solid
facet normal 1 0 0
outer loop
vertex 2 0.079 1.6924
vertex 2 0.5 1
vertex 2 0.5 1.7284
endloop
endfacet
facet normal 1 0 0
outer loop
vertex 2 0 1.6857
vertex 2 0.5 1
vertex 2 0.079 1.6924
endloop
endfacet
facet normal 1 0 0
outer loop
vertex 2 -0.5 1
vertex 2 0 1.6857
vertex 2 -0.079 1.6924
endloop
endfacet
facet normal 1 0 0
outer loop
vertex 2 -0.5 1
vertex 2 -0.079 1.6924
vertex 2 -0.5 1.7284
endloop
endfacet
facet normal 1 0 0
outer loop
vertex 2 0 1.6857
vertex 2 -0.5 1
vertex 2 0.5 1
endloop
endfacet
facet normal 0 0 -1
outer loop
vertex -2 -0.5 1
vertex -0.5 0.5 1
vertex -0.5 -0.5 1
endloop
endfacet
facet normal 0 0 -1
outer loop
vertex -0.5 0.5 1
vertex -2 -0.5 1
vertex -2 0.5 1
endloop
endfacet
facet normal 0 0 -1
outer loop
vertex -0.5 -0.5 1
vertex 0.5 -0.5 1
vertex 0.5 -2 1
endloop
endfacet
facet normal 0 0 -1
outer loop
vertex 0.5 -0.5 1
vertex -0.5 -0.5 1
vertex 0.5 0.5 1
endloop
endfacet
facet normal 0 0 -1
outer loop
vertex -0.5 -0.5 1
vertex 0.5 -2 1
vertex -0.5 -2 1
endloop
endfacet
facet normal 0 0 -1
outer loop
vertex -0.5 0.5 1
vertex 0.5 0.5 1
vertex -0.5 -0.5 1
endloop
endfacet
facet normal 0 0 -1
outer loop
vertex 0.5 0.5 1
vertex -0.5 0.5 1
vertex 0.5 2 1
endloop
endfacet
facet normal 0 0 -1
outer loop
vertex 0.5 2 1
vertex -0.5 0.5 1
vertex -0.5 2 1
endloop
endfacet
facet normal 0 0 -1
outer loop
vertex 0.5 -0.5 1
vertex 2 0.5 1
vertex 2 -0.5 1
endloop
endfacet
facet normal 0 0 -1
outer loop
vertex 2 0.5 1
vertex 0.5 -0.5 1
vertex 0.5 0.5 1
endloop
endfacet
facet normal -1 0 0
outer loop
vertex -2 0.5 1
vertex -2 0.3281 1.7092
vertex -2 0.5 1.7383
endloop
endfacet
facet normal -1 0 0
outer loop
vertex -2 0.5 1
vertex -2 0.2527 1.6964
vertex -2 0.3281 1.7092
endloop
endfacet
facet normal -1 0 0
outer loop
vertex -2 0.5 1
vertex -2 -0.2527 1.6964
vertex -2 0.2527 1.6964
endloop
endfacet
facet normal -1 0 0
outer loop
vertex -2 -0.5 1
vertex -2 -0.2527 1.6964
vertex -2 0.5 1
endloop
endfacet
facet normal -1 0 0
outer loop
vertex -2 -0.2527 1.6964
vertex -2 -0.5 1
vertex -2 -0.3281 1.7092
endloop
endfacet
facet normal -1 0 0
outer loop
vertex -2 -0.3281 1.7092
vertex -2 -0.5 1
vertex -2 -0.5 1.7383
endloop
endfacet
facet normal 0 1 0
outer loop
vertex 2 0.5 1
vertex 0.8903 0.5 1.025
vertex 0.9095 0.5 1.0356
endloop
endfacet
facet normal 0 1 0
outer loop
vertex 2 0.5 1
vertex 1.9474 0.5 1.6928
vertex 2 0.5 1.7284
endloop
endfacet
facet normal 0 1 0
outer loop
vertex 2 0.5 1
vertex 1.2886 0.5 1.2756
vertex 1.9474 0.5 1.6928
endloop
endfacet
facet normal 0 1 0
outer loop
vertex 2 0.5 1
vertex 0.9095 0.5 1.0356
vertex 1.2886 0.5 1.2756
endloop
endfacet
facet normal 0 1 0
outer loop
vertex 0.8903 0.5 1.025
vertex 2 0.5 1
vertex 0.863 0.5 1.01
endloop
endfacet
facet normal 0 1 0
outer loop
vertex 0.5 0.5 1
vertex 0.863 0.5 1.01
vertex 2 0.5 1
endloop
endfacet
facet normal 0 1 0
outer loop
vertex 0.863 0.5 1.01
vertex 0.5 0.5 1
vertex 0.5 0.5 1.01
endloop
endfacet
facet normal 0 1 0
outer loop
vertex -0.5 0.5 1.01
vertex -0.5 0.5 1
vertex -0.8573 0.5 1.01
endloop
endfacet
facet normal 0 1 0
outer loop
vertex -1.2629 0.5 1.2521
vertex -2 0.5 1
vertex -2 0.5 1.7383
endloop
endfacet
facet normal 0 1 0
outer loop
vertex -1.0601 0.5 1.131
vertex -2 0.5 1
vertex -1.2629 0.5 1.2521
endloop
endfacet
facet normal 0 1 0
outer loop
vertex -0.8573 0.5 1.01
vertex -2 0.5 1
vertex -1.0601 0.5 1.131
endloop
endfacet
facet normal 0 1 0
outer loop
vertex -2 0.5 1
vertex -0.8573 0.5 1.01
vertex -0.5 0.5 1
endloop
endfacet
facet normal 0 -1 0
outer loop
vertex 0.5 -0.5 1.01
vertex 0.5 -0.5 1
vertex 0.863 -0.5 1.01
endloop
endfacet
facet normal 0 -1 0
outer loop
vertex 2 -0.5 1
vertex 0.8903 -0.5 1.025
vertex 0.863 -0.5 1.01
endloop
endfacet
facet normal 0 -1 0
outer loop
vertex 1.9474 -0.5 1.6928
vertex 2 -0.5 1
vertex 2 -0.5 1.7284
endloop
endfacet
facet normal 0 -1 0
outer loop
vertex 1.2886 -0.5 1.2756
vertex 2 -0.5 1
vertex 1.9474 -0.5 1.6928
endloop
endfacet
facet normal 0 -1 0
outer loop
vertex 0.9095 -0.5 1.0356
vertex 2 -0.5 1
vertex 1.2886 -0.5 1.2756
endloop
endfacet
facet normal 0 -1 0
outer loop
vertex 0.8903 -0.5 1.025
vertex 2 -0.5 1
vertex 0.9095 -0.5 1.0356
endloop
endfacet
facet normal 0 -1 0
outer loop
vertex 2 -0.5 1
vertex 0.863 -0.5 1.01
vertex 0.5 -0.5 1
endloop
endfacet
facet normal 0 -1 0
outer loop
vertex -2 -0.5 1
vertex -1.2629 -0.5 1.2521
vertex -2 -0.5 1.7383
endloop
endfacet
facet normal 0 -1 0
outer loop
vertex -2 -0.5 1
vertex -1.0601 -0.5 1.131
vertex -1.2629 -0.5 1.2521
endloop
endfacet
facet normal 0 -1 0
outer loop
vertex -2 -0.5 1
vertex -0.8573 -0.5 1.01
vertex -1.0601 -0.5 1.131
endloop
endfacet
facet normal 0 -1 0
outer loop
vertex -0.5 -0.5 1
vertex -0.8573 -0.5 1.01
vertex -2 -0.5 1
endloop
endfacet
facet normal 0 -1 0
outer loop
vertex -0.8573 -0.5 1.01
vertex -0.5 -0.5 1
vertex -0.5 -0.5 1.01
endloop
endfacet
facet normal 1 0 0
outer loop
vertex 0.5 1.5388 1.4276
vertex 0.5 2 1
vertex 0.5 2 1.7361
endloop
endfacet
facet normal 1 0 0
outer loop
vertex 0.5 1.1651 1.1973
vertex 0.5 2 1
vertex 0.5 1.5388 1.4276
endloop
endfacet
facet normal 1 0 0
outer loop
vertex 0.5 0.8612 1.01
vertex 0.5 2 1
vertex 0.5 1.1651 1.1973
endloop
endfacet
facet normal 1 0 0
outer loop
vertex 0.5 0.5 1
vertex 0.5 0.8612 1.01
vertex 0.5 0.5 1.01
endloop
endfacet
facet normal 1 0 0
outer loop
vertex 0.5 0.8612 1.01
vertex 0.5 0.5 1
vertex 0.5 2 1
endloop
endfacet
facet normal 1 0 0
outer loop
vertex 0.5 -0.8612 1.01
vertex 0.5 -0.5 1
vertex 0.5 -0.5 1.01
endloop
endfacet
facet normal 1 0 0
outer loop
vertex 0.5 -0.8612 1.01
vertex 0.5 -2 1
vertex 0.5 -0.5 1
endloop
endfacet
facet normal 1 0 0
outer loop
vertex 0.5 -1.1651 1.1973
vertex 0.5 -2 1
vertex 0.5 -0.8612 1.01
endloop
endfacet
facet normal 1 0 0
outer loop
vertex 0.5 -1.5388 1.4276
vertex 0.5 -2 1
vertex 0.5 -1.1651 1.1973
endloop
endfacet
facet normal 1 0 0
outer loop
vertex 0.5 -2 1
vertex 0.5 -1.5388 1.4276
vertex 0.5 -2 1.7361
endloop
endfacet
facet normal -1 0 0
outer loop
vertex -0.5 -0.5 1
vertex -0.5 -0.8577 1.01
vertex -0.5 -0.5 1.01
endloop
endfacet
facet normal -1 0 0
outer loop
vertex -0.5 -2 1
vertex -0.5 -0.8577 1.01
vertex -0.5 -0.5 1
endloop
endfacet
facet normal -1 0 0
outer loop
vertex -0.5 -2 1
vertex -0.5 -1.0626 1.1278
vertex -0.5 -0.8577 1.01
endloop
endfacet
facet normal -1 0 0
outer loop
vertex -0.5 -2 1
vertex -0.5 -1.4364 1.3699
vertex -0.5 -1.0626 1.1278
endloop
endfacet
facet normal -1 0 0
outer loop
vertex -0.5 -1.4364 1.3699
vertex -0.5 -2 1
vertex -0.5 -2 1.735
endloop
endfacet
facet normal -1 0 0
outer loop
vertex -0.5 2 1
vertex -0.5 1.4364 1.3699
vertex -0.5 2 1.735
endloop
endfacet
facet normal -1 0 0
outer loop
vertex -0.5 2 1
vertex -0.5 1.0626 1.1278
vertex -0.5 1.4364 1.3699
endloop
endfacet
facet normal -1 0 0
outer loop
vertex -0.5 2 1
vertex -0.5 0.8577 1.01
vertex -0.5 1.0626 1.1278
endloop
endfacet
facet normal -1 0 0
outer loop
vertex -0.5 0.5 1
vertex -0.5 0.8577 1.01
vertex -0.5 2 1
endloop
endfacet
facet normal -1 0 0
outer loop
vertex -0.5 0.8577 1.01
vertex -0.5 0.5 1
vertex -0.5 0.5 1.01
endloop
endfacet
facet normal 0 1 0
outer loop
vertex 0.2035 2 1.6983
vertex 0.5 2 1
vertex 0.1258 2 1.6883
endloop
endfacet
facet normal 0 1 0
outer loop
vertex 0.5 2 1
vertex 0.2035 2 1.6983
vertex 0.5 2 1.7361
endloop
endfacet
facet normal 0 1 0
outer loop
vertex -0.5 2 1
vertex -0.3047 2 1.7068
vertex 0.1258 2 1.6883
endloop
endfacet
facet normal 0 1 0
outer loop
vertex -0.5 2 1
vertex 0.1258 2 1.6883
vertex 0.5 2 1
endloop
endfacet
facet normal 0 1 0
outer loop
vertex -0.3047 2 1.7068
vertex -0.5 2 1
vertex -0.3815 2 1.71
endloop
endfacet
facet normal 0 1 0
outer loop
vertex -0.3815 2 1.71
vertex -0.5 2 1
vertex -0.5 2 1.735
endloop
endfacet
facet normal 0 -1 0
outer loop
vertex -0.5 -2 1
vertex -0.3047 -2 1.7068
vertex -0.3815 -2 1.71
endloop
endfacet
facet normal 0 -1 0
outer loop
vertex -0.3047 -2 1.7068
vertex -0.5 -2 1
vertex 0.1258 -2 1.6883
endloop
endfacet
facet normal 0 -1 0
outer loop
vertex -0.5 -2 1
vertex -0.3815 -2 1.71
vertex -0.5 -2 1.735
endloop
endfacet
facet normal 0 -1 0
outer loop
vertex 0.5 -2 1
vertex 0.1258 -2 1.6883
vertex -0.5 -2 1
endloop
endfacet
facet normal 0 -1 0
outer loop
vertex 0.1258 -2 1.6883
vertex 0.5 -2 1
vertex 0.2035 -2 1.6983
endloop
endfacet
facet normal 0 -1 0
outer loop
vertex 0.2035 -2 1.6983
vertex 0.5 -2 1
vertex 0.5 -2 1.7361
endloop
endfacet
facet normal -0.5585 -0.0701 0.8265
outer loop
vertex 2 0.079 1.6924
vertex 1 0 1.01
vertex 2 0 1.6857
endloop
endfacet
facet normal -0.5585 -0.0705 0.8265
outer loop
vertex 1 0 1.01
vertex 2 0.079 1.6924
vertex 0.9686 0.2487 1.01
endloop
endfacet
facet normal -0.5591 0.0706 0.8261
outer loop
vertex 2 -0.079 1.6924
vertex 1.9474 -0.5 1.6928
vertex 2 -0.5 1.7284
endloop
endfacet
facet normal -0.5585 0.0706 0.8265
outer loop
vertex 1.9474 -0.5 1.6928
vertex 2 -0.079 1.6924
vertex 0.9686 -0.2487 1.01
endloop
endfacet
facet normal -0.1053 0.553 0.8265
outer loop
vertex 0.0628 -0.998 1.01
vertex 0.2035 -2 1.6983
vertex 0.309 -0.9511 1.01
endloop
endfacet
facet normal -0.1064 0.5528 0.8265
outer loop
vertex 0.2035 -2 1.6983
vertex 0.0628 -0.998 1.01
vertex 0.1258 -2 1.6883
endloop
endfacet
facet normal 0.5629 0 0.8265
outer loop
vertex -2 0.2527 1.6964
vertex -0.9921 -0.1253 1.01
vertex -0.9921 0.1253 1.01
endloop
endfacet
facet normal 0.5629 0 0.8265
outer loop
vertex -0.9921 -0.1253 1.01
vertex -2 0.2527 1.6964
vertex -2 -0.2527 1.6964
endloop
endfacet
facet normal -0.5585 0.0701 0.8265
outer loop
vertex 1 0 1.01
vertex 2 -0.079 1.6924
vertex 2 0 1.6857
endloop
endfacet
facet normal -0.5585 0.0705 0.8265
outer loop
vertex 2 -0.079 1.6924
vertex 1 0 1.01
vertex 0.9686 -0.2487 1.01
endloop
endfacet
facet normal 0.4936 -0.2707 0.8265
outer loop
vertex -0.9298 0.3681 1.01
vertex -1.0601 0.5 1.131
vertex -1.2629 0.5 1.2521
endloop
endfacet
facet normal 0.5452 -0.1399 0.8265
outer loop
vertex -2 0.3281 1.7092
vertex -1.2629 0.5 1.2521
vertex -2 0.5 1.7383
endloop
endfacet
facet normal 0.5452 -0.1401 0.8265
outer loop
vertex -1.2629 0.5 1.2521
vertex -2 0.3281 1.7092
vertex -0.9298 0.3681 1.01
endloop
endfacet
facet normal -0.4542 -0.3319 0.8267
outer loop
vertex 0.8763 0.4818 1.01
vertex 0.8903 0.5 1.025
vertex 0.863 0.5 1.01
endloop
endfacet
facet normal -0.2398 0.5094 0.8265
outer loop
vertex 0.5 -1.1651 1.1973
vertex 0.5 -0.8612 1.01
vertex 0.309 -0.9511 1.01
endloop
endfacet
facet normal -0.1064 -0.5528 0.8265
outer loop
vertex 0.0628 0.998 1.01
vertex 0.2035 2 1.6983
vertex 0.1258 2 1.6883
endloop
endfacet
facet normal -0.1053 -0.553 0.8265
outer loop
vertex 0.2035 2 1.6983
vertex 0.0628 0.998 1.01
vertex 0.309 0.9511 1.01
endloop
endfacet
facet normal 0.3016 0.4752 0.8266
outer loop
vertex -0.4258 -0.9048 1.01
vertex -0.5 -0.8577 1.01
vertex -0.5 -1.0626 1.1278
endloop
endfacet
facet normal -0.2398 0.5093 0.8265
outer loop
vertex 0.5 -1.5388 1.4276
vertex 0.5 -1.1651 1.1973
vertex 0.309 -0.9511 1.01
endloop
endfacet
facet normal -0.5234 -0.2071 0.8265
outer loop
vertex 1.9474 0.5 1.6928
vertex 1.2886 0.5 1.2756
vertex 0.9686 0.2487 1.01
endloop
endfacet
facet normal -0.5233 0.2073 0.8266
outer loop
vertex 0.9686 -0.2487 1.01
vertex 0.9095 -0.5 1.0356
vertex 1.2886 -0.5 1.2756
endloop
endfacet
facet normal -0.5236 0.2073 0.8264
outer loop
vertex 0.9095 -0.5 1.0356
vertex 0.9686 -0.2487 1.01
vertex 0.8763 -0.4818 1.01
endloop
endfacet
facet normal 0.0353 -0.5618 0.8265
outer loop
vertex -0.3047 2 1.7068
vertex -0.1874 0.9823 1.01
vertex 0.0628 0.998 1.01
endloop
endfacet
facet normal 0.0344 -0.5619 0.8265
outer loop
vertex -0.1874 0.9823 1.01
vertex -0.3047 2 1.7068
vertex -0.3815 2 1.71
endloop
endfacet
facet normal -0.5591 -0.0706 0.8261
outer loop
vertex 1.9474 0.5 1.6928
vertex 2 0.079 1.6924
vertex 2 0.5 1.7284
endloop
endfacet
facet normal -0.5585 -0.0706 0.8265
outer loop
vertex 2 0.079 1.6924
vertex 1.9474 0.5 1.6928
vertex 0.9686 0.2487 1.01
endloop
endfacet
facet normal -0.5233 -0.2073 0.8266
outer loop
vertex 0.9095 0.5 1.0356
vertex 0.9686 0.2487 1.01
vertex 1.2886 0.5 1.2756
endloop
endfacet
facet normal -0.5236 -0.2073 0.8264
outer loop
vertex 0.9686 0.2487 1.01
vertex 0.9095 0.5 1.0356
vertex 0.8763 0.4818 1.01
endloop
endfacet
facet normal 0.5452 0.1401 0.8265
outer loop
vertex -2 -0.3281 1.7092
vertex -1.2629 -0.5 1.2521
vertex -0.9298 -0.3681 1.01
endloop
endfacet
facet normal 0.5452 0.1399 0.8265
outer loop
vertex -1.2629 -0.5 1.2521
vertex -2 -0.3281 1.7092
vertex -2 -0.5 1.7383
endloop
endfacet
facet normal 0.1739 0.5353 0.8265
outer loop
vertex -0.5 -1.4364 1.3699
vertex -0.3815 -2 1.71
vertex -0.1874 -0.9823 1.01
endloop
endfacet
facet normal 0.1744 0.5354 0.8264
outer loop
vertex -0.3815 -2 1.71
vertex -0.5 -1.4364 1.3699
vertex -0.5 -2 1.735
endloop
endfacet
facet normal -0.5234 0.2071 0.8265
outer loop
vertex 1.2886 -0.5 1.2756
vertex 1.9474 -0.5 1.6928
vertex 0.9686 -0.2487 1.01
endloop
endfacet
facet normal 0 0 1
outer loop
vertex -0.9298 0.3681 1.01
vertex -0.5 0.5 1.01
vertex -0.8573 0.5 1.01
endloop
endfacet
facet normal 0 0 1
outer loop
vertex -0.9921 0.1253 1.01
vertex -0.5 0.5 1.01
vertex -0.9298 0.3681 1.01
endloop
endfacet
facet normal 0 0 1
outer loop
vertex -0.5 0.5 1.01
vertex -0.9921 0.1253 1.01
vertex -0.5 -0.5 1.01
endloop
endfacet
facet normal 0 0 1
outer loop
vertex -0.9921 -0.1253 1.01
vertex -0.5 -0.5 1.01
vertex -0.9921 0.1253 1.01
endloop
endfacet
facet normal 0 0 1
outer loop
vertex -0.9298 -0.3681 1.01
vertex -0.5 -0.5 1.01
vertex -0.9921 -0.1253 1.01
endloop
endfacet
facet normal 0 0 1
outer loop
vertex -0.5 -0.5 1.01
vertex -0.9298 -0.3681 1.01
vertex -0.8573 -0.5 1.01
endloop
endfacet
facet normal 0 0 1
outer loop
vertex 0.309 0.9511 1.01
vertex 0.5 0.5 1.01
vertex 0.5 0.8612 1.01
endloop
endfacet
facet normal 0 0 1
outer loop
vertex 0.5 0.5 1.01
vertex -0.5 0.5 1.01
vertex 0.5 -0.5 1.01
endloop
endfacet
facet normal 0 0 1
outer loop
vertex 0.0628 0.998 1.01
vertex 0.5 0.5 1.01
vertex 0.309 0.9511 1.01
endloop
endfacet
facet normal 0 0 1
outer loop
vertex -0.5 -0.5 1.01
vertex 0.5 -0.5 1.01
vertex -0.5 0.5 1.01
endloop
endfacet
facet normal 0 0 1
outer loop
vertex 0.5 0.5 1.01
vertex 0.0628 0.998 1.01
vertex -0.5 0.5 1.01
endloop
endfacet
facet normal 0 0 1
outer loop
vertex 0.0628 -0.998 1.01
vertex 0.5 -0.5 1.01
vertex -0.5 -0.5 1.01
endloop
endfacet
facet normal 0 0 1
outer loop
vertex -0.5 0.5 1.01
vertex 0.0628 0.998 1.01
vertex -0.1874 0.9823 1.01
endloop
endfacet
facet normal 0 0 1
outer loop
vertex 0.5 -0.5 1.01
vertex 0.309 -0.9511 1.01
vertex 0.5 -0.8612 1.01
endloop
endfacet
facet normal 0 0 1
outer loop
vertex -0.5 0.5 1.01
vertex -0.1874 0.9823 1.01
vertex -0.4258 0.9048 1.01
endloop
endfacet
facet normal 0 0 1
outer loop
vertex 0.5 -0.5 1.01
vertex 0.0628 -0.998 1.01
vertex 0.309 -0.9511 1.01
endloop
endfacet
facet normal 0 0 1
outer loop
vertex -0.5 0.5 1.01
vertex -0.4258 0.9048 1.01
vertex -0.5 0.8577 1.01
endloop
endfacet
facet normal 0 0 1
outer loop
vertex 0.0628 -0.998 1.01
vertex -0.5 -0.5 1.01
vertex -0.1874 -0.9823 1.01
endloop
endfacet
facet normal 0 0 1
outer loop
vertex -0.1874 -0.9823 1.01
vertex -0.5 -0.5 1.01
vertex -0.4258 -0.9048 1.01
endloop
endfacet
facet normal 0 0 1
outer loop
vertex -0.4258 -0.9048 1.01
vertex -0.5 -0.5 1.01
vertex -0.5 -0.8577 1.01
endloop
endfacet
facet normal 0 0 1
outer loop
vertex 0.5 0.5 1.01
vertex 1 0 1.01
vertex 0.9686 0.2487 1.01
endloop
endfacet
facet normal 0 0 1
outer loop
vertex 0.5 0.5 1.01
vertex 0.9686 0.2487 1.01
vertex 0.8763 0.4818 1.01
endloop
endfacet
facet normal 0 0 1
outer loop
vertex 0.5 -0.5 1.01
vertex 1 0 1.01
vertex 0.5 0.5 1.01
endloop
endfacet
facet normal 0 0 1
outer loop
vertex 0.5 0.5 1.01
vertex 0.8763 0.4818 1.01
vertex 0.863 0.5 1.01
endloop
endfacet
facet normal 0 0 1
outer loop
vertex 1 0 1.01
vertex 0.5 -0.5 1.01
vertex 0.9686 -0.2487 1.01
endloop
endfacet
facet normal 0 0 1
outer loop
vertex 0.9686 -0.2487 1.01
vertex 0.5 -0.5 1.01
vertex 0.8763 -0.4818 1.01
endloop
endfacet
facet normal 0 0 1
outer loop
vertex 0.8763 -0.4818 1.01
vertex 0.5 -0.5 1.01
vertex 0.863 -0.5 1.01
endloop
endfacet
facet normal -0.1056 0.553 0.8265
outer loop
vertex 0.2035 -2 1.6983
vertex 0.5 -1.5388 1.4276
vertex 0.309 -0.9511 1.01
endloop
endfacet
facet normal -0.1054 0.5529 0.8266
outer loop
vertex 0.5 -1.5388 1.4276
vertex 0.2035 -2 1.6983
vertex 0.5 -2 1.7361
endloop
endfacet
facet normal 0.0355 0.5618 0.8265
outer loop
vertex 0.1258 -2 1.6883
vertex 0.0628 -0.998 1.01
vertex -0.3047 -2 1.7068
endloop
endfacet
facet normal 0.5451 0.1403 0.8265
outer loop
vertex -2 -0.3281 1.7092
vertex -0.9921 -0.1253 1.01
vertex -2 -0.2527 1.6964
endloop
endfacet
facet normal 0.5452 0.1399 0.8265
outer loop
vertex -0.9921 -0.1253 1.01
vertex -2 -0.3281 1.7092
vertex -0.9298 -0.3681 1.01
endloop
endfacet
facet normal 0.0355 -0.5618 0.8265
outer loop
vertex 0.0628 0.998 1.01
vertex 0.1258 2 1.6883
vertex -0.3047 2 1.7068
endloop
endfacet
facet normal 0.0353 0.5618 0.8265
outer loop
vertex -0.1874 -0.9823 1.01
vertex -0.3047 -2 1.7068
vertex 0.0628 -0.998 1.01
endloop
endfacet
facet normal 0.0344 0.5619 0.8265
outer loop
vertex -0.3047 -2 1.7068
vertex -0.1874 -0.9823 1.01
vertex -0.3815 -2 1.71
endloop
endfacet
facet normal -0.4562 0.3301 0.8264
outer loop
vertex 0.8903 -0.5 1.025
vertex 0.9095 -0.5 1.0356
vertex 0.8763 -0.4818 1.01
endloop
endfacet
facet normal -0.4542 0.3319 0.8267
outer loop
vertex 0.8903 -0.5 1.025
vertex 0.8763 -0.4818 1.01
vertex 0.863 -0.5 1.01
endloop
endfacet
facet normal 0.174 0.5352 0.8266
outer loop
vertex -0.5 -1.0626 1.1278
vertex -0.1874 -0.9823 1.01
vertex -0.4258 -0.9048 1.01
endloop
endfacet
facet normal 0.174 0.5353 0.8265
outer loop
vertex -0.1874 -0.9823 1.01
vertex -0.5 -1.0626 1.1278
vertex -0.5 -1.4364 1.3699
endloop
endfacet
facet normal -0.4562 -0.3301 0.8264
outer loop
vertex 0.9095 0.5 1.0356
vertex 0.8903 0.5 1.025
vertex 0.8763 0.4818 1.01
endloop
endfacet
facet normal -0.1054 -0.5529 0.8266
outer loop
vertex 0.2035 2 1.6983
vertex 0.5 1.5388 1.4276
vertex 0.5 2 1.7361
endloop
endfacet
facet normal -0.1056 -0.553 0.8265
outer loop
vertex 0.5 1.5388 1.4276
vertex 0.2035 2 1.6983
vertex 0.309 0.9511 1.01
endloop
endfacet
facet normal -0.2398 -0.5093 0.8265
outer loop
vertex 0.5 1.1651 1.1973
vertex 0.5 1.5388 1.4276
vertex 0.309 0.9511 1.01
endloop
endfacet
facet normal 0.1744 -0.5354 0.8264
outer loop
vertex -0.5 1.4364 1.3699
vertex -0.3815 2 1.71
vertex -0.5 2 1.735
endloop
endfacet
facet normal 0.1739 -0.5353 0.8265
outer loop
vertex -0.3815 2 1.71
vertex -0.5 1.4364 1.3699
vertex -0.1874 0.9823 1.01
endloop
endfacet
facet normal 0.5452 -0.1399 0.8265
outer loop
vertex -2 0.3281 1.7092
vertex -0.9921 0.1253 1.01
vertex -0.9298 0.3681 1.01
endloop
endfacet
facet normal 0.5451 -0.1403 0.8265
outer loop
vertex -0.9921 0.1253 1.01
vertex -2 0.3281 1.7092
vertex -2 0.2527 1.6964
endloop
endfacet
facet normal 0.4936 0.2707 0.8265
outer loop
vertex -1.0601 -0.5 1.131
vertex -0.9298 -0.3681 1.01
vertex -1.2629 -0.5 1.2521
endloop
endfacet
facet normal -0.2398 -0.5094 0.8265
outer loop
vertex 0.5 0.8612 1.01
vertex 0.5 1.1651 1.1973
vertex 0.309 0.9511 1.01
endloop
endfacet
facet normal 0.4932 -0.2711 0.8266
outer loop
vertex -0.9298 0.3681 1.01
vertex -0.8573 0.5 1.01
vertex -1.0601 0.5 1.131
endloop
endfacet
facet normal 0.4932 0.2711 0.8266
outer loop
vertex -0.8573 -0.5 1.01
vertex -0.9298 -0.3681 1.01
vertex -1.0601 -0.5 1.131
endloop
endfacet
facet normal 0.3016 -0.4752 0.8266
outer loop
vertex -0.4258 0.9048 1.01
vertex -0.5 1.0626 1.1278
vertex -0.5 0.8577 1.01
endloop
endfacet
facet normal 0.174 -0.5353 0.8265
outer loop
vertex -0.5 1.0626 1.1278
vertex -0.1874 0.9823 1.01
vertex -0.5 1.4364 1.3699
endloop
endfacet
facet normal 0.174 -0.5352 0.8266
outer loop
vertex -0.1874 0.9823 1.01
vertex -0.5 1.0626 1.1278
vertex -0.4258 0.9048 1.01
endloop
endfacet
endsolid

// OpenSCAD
alt = 2;
larg=4;
comp=1;
/*difference(){

union(){translate([-2.4,-.6,1]) cube([larg,comp,alt-1]);
translate([-.6,-2.4,1]) cube([comp,larg,alt-1]);}
*/

difference(){

   
    
  union(){
      translate([-2,-.5,1]) cube([larg,comp,alt-1]);
      translate([-.5,-2,1]) cube([comp,larg,alt-1]);
      }

translate([0,0,1.01]) cylinder(h=1, r1=1, r2=2.48, center=false,$fn=25);
}




/*
union(){translate([-2.4,-.6,0]) cube([larg,comp,alt]);
translate([-.6,-2.4,0]) cube([comp,larg,alt]);}
*/
